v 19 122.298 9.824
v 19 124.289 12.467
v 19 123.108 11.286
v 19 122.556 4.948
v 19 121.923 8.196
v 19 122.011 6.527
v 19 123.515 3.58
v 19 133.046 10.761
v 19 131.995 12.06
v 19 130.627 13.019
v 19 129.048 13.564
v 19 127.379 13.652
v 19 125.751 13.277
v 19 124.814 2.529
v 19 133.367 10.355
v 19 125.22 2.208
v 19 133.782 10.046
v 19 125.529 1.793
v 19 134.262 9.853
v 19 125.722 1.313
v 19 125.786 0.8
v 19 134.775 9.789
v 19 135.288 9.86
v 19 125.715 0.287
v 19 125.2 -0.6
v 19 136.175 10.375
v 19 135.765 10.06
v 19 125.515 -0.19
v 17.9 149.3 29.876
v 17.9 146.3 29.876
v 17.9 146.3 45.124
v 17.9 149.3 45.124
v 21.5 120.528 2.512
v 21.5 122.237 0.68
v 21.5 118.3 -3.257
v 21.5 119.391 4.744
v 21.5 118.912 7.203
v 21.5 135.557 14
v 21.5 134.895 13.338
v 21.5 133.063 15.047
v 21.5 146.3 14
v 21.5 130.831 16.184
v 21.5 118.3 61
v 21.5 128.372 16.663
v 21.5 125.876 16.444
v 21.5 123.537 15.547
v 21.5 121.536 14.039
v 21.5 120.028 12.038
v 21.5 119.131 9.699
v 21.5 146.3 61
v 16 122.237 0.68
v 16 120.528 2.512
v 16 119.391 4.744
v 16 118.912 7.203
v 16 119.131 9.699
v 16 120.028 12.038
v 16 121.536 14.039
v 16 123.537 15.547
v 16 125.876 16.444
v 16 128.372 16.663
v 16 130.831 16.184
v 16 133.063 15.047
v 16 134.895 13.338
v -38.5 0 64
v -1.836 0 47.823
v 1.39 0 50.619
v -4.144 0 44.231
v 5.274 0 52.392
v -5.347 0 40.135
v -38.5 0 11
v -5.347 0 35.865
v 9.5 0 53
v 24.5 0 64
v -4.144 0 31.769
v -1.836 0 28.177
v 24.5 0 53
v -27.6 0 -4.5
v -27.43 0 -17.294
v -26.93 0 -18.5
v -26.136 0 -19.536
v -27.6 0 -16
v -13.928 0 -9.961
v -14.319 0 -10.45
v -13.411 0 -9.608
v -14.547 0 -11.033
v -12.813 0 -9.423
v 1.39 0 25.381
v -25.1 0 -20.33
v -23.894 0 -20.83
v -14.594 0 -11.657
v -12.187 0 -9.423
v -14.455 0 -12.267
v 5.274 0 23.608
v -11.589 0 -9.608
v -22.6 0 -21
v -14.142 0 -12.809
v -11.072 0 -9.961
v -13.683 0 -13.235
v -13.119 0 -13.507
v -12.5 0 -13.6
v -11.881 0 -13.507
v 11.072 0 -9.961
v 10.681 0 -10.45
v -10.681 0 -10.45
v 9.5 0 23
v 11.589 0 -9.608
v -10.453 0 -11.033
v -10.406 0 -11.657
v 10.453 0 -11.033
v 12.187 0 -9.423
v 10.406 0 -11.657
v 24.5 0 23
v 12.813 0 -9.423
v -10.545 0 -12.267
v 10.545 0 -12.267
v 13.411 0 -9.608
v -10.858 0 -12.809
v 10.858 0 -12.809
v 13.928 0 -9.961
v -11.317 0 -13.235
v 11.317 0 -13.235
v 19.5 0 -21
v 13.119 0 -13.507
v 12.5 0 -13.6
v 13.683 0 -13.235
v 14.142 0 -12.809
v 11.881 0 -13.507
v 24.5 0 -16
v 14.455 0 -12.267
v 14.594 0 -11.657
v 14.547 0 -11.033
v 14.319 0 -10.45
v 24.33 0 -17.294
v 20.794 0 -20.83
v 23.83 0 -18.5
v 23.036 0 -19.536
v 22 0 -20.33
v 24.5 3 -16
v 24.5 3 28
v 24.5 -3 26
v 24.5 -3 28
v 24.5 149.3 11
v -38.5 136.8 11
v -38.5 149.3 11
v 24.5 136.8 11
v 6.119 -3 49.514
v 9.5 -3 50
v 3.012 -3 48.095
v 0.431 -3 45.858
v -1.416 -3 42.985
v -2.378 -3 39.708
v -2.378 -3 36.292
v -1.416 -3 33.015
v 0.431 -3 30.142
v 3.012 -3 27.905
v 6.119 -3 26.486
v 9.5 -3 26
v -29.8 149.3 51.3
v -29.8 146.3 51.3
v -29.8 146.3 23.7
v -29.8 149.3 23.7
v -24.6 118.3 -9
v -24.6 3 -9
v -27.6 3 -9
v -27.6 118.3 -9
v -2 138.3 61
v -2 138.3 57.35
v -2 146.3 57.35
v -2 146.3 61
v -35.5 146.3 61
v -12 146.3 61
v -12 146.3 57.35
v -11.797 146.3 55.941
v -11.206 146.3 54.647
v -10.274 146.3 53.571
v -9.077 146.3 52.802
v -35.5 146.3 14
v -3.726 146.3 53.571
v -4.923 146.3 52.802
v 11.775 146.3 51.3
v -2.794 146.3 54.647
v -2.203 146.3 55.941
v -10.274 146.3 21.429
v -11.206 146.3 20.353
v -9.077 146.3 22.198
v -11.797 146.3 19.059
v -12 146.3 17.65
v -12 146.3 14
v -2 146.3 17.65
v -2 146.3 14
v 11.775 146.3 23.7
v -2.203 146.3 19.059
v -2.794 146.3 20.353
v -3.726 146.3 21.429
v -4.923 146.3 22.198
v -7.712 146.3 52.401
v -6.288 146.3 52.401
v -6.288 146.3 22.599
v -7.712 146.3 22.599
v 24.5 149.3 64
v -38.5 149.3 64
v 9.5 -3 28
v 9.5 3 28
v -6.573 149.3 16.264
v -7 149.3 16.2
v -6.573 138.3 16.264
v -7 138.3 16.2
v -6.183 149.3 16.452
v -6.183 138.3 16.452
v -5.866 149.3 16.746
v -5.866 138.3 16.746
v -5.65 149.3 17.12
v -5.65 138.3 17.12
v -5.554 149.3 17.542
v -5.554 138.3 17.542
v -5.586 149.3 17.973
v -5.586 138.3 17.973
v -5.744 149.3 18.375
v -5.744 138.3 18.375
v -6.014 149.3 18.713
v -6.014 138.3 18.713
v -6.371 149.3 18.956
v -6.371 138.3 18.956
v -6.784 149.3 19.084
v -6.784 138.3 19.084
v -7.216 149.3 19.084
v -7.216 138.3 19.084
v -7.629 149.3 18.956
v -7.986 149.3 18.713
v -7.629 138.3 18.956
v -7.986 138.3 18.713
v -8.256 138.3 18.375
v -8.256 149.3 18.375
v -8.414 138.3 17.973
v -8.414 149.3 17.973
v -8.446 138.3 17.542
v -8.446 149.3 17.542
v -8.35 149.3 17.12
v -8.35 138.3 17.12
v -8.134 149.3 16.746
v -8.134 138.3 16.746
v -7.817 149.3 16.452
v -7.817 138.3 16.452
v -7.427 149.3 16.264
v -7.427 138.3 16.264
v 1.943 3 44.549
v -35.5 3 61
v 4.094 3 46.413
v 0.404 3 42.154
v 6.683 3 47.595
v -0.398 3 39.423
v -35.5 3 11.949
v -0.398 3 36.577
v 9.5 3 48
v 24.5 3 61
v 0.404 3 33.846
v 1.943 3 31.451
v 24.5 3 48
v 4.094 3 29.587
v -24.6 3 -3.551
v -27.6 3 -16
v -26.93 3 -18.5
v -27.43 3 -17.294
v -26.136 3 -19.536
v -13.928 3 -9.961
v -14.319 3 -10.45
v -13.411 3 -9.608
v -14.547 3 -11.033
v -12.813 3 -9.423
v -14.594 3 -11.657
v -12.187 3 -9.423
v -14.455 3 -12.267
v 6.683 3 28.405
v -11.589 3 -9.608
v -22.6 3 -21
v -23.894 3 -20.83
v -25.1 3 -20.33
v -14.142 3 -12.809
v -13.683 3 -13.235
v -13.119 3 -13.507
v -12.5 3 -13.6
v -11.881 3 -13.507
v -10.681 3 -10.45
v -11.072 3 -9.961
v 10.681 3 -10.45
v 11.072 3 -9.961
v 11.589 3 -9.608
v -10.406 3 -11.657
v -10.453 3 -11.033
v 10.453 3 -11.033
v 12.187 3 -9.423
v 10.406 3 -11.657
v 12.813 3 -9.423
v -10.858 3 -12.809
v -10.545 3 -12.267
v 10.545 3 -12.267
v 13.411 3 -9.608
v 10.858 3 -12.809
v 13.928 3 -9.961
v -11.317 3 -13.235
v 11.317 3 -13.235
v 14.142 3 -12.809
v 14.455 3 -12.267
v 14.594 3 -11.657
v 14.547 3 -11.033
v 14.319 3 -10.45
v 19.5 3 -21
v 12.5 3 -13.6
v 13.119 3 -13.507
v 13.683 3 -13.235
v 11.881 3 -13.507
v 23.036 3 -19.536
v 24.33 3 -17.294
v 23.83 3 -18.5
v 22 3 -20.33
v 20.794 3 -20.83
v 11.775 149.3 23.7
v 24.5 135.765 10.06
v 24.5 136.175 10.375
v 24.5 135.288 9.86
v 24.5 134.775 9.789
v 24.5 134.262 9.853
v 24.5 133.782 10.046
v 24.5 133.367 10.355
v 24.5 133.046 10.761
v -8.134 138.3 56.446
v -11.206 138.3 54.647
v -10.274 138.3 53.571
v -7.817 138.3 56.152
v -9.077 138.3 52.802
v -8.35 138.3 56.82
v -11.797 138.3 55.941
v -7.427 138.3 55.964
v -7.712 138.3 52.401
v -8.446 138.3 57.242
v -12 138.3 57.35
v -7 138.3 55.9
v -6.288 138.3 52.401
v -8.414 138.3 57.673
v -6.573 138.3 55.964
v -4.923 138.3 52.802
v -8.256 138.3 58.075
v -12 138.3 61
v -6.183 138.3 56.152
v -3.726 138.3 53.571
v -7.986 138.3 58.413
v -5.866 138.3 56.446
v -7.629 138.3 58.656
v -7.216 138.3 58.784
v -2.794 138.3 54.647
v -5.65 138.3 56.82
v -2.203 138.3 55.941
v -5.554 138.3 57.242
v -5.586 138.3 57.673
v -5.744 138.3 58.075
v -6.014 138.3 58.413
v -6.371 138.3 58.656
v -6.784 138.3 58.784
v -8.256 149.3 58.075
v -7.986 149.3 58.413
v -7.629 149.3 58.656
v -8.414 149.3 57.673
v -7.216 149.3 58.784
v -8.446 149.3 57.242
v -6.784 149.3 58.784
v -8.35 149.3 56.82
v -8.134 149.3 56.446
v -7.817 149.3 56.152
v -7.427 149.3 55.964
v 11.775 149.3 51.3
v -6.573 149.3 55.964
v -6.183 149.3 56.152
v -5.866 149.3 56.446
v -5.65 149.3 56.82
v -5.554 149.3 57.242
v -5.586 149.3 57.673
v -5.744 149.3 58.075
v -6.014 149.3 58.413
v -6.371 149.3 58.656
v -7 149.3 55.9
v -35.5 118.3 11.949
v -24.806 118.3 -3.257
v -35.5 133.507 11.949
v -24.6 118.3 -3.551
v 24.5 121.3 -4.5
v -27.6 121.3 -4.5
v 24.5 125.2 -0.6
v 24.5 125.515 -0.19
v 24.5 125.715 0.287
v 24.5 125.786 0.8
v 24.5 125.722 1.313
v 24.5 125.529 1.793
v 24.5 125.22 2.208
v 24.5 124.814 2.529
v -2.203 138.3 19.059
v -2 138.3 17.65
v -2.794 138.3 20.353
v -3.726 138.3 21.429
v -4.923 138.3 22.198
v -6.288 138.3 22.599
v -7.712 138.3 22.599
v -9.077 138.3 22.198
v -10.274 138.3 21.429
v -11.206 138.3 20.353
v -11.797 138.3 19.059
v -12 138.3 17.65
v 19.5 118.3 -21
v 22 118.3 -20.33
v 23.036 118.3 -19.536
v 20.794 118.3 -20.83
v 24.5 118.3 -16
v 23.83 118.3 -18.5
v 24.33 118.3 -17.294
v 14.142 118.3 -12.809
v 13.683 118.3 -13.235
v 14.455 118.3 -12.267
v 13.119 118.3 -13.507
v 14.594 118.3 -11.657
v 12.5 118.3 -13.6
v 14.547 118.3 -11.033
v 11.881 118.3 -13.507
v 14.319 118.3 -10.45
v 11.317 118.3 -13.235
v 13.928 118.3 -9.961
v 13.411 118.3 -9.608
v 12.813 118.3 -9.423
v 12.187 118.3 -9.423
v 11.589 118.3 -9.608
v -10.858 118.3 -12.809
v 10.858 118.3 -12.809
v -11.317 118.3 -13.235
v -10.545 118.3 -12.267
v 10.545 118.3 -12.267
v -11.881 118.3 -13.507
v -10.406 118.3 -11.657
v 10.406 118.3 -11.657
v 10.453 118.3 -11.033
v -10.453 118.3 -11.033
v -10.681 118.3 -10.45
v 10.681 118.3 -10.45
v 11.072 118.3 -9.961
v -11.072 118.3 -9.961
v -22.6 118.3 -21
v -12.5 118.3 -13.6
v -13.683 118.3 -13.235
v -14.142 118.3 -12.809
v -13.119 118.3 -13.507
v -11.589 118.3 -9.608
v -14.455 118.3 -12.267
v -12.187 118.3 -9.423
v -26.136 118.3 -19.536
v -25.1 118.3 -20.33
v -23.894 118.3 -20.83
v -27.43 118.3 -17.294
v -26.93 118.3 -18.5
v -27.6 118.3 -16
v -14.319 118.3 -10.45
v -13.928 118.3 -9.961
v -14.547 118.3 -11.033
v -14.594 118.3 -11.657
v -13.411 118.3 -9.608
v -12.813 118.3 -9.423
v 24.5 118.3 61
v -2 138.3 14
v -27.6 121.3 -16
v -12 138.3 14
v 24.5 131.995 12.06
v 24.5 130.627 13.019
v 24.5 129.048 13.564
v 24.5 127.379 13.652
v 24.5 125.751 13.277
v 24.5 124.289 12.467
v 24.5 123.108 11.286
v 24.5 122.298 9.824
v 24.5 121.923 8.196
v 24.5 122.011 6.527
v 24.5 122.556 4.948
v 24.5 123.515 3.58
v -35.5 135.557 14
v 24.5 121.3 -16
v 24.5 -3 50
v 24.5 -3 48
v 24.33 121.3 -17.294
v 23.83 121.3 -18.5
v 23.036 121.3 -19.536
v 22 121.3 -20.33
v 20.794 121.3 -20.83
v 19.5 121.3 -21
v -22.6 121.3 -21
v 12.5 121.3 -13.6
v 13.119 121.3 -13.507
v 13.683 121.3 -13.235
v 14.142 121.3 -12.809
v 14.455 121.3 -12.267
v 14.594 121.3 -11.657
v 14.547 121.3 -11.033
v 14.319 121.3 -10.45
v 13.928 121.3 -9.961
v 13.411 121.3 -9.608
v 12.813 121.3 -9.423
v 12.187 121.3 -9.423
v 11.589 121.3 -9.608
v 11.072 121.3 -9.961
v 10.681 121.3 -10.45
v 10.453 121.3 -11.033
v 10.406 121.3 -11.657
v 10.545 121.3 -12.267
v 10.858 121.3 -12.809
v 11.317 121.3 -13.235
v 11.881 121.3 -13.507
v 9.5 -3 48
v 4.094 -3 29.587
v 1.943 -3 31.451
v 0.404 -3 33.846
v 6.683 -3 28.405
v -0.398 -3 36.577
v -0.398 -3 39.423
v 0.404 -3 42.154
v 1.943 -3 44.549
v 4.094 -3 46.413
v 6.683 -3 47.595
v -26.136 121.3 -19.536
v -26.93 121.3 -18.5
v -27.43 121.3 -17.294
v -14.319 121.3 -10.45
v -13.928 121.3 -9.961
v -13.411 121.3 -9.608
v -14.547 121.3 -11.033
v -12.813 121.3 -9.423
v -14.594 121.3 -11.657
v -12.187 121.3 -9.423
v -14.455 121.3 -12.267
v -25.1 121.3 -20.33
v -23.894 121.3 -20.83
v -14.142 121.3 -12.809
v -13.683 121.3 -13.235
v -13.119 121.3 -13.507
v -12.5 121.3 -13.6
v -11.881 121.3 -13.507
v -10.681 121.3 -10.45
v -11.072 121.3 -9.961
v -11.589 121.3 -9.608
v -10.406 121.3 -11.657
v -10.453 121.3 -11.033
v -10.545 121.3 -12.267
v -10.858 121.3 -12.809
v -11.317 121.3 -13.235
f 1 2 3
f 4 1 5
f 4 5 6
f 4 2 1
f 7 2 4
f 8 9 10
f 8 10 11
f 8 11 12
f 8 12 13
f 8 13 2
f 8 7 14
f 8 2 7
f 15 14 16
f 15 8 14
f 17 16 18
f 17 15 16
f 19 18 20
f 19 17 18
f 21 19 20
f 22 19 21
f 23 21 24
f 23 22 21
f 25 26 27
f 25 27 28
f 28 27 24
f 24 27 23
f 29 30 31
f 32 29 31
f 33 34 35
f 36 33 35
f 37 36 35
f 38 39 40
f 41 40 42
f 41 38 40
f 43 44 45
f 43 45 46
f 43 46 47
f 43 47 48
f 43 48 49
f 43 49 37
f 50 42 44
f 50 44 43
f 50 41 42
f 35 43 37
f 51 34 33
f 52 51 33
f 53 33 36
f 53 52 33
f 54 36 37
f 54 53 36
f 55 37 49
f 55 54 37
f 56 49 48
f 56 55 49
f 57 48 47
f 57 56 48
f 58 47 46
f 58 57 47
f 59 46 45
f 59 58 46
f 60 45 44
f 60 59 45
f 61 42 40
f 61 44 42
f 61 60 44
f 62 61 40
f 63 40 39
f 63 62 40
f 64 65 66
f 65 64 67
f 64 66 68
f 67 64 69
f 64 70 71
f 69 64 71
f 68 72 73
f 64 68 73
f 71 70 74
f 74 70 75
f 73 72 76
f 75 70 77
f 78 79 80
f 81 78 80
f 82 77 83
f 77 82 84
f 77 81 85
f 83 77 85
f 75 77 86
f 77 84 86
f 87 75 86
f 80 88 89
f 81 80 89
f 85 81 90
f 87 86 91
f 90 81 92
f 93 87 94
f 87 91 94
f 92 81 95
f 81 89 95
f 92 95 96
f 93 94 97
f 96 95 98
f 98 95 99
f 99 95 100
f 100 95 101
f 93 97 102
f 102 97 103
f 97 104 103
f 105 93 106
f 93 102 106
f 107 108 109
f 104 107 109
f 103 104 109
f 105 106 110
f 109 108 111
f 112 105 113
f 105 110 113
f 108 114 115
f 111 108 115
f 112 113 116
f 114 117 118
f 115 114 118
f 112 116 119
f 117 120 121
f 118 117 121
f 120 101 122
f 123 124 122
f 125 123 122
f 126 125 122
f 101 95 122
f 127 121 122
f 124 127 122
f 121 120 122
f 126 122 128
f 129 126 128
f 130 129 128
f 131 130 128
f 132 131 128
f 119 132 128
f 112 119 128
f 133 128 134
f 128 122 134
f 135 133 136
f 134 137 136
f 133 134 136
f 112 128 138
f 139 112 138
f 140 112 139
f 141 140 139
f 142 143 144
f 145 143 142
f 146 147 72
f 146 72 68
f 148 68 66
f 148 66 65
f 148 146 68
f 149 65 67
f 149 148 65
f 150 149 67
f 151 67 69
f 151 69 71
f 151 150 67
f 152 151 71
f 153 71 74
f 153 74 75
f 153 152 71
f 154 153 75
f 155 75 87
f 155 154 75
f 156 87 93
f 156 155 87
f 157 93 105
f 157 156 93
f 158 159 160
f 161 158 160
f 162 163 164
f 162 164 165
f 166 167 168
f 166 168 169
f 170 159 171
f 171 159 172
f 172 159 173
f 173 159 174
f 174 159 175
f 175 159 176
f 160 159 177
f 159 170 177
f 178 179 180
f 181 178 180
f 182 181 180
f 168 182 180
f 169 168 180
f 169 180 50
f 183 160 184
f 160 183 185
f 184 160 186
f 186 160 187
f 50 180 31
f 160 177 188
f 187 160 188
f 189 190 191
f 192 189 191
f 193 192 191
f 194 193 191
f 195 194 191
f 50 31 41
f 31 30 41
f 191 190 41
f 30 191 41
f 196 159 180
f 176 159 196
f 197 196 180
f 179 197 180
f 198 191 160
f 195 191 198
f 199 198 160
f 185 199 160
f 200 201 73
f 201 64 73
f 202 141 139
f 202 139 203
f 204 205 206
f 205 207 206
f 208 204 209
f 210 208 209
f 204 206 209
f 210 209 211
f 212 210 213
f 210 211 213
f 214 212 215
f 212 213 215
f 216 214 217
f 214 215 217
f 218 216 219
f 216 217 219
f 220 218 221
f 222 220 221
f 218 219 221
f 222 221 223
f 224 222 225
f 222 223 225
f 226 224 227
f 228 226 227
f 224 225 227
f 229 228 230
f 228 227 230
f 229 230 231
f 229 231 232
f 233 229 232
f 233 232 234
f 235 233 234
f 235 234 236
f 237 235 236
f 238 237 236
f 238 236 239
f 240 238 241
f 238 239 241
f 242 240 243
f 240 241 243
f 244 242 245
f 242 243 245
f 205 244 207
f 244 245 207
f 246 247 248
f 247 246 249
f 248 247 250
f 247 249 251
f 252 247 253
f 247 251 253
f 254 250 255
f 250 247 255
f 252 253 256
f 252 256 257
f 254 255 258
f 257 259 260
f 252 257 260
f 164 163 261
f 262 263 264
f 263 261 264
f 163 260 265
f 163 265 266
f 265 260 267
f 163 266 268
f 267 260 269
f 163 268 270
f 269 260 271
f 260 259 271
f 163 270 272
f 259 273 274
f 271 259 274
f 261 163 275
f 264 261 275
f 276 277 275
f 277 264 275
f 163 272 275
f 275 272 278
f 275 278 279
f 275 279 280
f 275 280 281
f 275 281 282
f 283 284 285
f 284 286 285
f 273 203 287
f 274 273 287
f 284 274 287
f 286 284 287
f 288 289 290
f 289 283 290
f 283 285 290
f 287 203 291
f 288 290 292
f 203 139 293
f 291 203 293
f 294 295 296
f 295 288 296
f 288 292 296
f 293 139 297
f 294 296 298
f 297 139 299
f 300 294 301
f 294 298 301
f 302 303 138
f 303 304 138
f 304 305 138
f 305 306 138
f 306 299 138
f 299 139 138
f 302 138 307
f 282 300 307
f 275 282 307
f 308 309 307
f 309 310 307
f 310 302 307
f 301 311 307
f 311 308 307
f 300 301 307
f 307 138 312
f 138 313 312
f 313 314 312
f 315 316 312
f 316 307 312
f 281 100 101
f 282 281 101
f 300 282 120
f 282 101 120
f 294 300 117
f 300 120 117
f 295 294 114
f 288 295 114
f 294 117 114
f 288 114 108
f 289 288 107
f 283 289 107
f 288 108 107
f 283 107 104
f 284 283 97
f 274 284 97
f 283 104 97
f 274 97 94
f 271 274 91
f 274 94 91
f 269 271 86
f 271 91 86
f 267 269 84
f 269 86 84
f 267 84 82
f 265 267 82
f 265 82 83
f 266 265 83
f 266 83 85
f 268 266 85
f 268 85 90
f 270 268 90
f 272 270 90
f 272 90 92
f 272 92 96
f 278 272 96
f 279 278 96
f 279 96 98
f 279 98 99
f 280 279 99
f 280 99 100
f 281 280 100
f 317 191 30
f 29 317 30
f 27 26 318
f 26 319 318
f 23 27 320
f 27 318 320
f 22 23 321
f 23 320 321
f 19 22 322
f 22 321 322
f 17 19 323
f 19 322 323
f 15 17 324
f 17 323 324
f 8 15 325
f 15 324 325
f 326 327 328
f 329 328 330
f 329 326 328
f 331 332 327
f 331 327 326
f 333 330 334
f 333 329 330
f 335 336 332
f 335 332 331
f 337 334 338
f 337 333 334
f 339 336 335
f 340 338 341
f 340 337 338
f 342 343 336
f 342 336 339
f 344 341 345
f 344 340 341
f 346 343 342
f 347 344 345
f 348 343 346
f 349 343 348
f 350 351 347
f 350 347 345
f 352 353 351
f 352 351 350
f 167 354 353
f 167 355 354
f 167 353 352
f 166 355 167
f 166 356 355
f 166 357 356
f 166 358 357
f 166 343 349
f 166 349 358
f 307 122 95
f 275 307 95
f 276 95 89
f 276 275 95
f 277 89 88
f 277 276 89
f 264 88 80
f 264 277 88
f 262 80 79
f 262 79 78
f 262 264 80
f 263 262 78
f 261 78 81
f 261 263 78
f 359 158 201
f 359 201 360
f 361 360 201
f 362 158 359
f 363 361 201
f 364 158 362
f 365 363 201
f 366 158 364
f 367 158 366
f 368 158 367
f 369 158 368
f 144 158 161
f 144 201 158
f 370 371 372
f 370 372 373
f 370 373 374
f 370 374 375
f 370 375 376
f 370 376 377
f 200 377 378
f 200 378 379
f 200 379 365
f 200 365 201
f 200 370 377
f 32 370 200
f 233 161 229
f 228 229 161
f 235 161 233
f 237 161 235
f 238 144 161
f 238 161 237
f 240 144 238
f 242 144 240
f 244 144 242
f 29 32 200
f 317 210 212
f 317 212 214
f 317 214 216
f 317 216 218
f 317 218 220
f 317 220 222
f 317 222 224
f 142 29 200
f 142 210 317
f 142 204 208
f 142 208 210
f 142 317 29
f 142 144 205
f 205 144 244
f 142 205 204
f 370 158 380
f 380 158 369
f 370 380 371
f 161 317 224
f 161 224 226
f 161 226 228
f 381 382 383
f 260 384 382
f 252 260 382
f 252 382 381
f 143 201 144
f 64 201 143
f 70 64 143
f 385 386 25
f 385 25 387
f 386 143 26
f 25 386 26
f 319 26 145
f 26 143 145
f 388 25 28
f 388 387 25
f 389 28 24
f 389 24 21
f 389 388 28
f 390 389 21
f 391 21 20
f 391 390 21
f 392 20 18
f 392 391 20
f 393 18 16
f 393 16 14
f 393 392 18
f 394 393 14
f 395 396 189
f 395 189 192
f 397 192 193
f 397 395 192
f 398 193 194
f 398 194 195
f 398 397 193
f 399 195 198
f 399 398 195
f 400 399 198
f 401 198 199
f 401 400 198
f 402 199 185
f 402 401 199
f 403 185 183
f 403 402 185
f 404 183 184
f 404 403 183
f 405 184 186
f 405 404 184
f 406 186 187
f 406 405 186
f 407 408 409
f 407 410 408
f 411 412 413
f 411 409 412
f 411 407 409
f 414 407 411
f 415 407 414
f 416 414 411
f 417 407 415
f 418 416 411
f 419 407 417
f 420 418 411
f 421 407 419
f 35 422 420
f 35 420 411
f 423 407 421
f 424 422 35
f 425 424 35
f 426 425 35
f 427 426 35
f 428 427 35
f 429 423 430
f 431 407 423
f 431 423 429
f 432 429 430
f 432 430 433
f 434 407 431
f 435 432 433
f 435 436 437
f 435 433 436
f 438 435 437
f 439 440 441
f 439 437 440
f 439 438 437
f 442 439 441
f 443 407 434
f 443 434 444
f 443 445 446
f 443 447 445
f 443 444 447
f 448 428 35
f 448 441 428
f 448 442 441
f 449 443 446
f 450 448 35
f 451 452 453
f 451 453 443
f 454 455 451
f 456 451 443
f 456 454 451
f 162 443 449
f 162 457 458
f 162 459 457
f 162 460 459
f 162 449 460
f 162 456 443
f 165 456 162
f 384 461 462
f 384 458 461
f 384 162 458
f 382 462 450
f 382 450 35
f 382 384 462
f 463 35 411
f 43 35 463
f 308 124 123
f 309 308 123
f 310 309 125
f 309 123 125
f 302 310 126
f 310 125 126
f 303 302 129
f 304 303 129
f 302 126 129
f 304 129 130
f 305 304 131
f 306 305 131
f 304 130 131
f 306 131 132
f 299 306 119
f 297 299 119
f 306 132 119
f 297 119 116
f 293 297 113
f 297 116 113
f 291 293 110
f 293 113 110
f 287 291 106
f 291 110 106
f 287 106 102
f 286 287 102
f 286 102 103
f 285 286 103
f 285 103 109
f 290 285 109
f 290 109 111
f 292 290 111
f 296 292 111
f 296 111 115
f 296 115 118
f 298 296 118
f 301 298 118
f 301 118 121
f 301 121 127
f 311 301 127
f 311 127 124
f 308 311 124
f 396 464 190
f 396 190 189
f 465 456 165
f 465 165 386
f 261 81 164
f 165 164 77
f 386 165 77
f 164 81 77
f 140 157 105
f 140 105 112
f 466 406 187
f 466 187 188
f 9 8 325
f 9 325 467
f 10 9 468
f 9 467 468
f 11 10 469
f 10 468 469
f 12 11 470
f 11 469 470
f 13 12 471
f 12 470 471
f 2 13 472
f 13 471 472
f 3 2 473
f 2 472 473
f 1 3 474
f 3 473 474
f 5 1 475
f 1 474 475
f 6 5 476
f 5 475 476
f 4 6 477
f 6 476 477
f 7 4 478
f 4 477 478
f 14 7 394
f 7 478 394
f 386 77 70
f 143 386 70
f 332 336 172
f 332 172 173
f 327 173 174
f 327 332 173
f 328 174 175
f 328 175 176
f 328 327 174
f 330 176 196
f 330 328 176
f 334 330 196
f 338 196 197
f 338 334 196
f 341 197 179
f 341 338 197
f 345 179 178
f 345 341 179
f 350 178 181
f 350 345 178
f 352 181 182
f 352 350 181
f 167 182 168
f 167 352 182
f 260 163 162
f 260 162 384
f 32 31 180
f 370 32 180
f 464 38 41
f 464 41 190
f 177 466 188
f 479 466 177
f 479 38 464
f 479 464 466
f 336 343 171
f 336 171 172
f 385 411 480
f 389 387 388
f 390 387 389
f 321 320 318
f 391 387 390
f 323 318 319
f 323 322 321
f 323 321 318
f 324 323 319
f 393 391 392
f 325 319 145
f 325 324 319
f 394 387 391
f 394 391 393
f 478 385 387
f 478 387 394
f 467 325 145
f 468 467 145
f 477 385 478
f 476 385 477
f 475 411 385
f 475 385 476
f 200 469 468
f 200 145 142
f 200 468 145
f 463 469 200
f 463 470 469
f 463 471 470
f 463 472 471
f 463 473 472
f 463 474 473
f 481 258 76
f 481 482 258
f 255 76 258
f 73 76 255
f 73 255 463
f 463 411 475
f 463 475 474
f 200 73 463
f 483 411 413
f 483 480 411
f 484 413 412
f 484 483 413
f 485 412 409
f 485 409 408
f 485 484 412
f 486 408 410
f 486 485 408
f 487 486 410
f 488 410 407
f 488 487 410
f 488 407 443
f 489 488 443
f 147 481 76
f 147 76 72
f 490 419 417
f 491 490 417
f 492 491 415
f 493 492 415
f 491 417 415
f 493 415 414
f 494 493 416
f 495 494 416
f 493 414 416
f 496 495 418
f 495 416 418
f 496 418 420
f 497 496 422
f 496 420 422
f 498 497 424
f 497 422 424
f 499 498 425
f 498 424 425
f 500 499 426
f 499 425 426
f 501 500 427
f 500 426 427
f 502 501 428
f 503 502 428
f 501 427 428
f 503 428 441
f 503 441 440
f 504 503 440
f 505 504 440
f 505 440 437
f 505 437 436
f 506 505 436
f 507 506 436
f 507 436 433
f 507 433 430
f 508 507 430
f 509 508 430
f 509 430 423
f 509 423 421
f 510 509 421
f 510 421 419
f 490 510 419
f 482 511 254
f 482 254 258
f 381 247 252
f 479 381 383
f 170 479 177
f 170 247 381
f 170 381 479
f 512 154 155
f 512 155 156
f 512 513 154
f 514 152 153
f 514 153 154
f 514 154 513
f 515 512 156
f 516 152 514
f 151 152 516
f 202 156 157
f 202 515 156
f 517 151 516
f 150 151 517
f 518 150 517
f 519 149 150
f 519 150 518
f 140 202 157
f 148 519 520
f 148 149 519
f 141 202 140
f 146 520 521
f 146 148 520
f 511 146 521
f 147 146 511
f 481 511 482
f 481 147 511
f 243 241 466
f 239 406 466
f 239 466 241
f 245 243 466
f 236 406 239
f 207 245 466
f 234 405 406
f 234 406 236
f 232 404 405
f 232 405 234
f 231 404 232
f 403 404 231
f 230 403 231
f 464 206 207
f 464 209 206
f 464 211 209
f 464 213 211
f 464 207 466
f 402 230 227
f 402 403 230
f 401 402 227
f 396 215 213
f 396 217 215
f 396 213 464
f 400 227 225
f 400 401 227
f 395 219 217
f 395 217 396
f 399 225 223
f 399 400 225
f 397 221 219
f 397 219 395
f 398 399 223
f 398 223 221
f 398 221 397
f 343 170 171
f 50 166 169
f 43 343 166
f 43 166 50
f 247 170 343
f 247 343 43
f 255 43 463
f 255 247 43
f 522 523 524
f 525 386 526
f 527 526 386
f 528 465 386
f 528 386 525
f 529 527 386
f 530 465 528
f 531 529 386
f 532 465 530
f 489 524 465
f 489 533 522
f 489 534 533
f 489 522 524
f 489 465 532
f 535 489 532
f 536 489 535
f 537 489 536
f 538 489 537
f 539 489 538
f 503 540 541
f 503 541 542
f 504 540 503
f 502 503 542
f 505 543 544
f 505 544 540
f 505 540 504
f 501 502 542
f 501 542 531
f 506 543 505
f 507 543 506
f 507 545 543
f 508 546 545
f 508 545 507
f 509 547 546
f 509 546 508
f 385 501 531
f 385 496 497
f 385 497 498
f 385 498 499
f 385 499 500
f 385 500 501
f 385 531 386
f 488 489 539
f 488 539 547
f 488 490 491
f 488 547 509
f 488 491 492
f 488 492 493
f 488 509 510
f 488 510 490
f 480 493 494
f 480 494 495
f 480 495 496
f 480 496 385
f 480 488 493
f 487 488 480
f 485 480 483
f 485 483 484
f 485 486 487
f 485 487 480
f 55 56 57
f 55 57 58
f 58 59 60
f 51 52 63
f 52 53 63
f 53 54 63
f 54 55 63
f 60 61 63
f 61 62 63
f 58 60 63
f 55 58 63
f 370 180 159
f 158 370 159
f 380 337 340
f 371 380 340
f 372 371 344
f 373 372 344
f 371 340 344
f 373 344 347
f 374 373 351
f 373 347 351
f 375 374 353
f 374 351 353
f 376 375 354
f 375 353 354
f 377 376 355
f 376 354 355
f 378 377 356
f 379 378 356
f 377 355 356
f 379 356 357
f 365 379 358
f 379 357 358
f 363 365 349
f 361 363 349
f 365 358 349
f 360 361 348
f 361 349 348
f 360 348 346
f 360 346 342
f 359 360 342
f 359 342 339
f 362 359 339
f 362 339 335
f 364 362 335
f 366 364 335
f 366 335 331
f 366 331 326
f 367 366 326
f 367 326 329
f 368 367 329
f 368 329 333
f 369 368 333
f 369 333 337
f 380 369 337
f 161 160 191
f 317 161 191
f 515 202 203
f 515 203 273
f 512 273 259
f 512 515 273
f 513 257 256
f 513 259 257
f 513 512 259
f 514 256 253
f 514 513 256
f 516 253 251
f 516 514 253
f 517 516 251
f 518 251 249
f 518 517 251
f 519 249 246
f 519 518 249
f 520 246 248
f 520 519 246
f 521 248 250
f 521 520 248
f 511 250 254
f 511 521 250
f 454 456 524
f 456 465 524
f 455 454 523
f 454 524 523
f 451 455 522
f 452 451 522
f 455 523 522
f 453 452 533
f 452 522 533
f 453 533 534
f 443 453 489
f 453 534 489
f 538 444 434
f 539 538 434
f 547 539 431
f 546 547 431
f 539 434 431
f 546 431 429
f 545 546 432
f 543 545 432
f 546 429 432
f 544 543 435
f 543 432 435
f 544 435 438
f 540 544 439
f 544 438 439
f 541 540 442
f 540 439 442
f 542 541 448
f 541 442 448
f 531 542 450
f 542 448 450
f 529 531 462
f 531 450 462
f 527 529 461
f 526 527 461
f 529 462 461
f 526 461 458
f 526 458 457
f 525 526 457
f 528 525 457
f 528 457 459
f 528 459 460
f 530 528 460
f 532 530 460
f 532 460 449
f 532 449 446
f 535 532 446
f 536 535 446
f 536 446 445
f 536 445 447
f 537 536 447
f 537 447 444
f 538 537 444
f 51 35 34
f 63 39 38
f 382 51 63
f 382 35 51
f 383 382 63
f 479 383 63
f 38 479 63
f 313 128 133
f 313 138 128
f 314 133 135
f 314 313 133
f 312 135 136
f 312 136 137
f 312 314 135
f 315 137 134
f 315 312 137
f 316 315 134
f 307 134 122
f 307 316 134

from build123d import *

# Parameters (mm, degrees)
SKETCH2_W           = 63
SKETCH2_H           = 53
BOSS_EXTRUDE1_DEPTH = 121.3
BOSS_EXTRUDE2_START = 121.3
SKETCH2_3_W         = 63
SKETCH2_3_H         = 53
BOSS_EXTRUDE2_DEPTH = 28
CHAMFER5_SIZE       = 15.5
SKETCH7_R           = 6
CUT_EXTRUDE3_DEPTH  = 5.5
FILLET5_R           = 2
SHELL2_START        = 3
SHELL2_DEPTH        = 115.3
SHELL2_START_2      = 134.895176786
SHELL2_2_DEPTH      = 11.404823214
SHELL2_START_3      = 118.3
SHELL2_3_DEPTH      = 0.6
SHELL2_START_4      = -35.5
SHELL2_4_DEPTH      = 51.5
SHELL2_START_5      = 16
SHELL2_5_DEPTH      = 8.5
SHELL2_START_6      = -25.165077586
SHELL2_6_DEPTH      = 3
SKETCH4_W           = 12
SKETCH4_H           = 115.3
CUT_EXTRUDE1_DEPTH  = 175.228269807
BOSS_EXTRUDE5_START = -3
BOSS_EXTRUDE5_DEPTH = 3
CUT_EXTRUDE2_REACH  = 168.939
SKETCH6_R           = 2.1
SKETCH8_R           = 1.45
CUT_EXTRUDE4_DEPTH  = 3
BOSS_EXTRUDE6_START = 8
SKETCH8_3_R         = 1.45
BOSS_EXTRUDE6_DEPTH = 8
CUT_EXTRUDE5_REACH  = 168.939
BOSS_EXTRUDE7_START = 3
BOSS_EXTRUDE7_DEPTH = 3
CHAMFER7_SIZE       = 3
FILLET6_R           = 5


with BuildPart() as part:
    # Sketch2 → Boss-Extrude1 (new body)
    with BuildSketch(Plane(origin=(0, 0, 0), x_dir=(1, 0, 0), z_dir=(0, 1, 0))):
        Polygon((24.5, -11), (24.5, 21), (-27.6, 21), (-27.6, 4.5), (-38.5, -11), align=None)
        with Locations((-7, -37.5)):
            Rectangle(SKETCH2_W, SKETCH2_H)
    extrude(amount=BOSS_EXTRUDE1_DEPTH)

    # Sketch2<3> → Boss-Extrude2 (add)
    with BuildSketch(Plane(origin=(0, 0, 0), x_dir=(1, 0, 0), z_dir=(0, 1, 0)).offset(BOSS_EXTRUDE2_START)):
        with Locations((-7, -37.5)):
            Rectangle(SKETCH2_3_W, SKETCH2_3_H)
    extrude(amount=BOSS_EXTRUDE2_DEPTH)

    # Chamfer5
    chamfer5_edges = [part.edges().sort_by_distance(p)[0] for p in [
        (-7, 121.3, 11),
    ]]
    chamfer(chamfer5_edges, length=CHAMFER5_SIZE)

    # Sketch7 → Cut-Extrude3 (cut)
    with BuildSketch(Plane(origin=(24.5, 0, 0), x_dir=(0, 0, -1), z_dir=(1, 0, 0))):
        with Locations((-7.675, 127.9)):
            Circle(SKETCH7_R)
    extrude(amount=-CUT_EXTRUDE3_DEPTH, mode=Mode.SUBTRACT)

    # Fillet5
    fillet5_edges = [part.edges().sort_by_distance(p)[0] for p in [
        (21.75, 133.885912692, 8.085912692),
        (21.75, 127.489087308, 1.689087308),
    ]]
    fillet(fillet5_edges, radius=FILLET5_R)

    # Shell2: read off the stored shape, not the designer's step
    # Shell2 outline → Shell2 (cut)
    with BuildSketch(Plane(origin=(0, 0, 0), x_dir=(1, 0, 0), z_dir=(0, 1, 0)).offset(SHELL2_START)):
        Polygon((-24.6, 3.550767359), (-35.5, -11.949232641), (-35.5, -61), (24.5, -61), (24.5, 18), (-24.6, 18), align=None)
    extrude(amount=SHELL2_DEPTH, mode=Mode.SUBTRACT)

    # Shell2 2 outline → Shell2 2 (cut)
    with BuildSketch(Plane(origin=(0, 0, 0), x_dir=(1, 0, 0), z_dir=(0, 1, 0)).offset(SHELL2_START_2)):
        Polygon((16, -14), (-35.5, -14), (-35.5, -61), (24.5, -61), (24.5, -14), align=None)
    extrude(amount=SHELL2_2_DEPTH, mode=Mode.SUBTRACT)

    # Shell2 3 outline → Shell2 3 (cut)
    with BuildSketch(Plane(origin=(0, 0, 0), x_dir=(1, 0, 0), z_dir=(0, 1, 0)).offset(SHELL2_START_3)):
        Polygon((16, -14), (-35.5, -14), (-35.5, -61), (24.5, -61), (24.5, -14), align=None)
    extrude(amount=SHELL2_3_DEPTH, mode=Mode.SUBTRACT)

    # Shell2 4 outline → Shell2 4 (cut)
    with BuildSketch(Plane.YZ.offset(SHELL2_START_4)):
        Polygon((134.895176786, 61), (118.9, 61), (118.9, 14), (118.3, 14), (118.3, -3.257359313), (135.557359313, 14), (134.895176786, 14), align=None)
    extrude(amount=SHELL2_4_DEPTH, mode=Mode.SUBTRACT)

    # Shell2 5 outline → Shell2 5 (cut)
    with BuildSketch(Plane.YZ.offset(SHELL2_START_5)):
        with BuildLine():
            Line((134.895176786, 61), (118.9, 61))
            Line((118.9, 61), (118.9, 14))
            Line((118.9, 14), (118.3, 14))
            Line((118.3, 14), (118.3, -3.257359313))
            Line((118.3, -3.257359313), (122.237182527, 0.679823214))
            ThreePointArc((122.237182527, 0.679823214), (121.536038969, 14.038961031), (134.895176786, 13.337817473))
            Line((134.895176786, 13.337817473), (135.557359313, 14))
            Line((135.557359313, 14), (134.895176786, 14))
            Line((134.895176786, 14), (134.895176786, 61))
        make_face()
    extrude(amount=SHELL2_5_DEPTH, mode=Mode.SUBTRACT)

    # Shell2 6 outline → Shell2 6 (add)
    with BuildSketch(Plane(origin=(0, 0, 0), x_dir=(0.5752319297142107, 0, -0.8179903587679168), z_dir=(0.8179903587679168, 0, 0.5752319297142109)).offset(SHELL2_START_6)):
        Polygon((-30.1950906, 3), (-11.246212005, 3), (-11.246212005, 118.3), (-11.604905776, 118.3), (-30.1950906, 133.506591954), align=None)
    extrude(amount=SHELL2_6_DEPTH)

    # Sketch4 → Cut-Extrude1 (cut, through all)
    with BuildSketch(Plane(origin=(24.5, 0, 0), x_dir=(0, 0, -1), z_dir=(1, 0, 0))):
        with Locations((15, 60.65)):
            Rectangle(SKETCH4_W, SKETCH4_H)
    extrude(amount=-CUT_EXTRUDE1_DEPTH, mode=Mode.SUBTRACT)

    # Sketch5 → Boss-Extrude5 (add)
    with BuildSketch(Plane(origin=(24.5, 0, 0), x_dir=(0, 0, -1), z_dir=(1, 0, 0)).offset(BOSS_EXTRUDE5_START)):
        with BuildLine():
            Line((3.257359313, 118.3), (-61, 118.3))
            Line((-61, 118.3), (-61, 146.3))
            Line((-61, 146.3), (-14, 146.3))
            Line((-14, 146.3), (-14, 135.557359313))
            Line((-14, 135.557359313), (-13.337817473, 134.895176786))
            ThreePointArc((-13.337817473, 134.895176786), (-14.038961031, 121.536038969), (-0.679823214, 122.237182527))
            Line((-0.679823214, 122.237182527), (3.257359313, 118.3))
        make_face()
    extrude(amount=BOSS_EXTRUDE5_DEPTH)

    # Cut-Extrude2: up to this face of the body (flat: up to its plane)
    cut_extrude2_end = Plane(part.part.faces().sort_by_distance((-1.55, 121.3, -12.75))[0])
    # Sketch6 → Cut-Extrude2 (cut, up to the picked face)
    with BuildSketch(Plane.XZ, mode=Mode.PRIVATE) as cut_extrude2_sk1:
        with Locations(Location((-12.5, -11.5, 0), (0, 0, 270))):
            Circle(SKETCH6_R)
    cut_extrude2_tool1 = split(extrude(cut_extrude2_sk1.sketch, amount=-CUT_EXTRUDE2_REACH, mode=Mode.PRIVATE), bisect_by=cut_extrude2_end, keep=Keep.BOTH, mode=Mode.PRIVATE)
    # Sketch6 → Cut-Extrude2 (cut, up to the picked face)
    with BuildSketch(Plane.XZ, mode=Mode.PRIVATE) as cut_extrude2_sk2:
        with Locations(Location((12.5, -11.5, 0), (0, 0, 270))):
            Circle(SKETCH6_R)
    cut_extrude2_tool2 = split(extrude(cut_extrude2_sk2.sketch, amount=-CUT_EXTRUDE2_REACH, mode=Mode.PRIVATE), bisect_by=cut_extrude2_end, keep=Keep.BOTH, mode=Mode.PRIVATE)
    add(cut_extrude2_tool1.solids().sort_by(Axis((-12.5, 0, -11.5), (0, 1, 0)))[0], mode=Mode.SUBTRACT)
    add(cut_extrude2_tool2.solids().sort_by(Axis((12.5, 0, -11.5), (0, 1, 0)))[0], mode=Mode.SUBTRACT)

    # Sketch8 → Cut-Extrude4 (cut)
    with BuildSketch(Plane.XZ.offset(-146.3)):
        Polygon((17.9, 45.123529412), (11.775, 51.3), (-29.8, 51.3), (-29.8, 23.7), (11.775, 23.7), (17.9, 29.876470588), align=None)
        with Locations(Location((-7, 17.65, 0), (0, 0, 270))):
            Circle(SKETCH8_R)
        with Locations(Location((-7, 57.35, 0), (0, 0, 270))):
            Circle(SKETCH8_R)
    extrude(amount=-CUT_EXTRUDE4_DEPTH, mode=Mode.SUBTRACT)

    # Sketch8<3> → Boss-Extrude6 (add)
    # profile 1 of 2: a face of its own
    with BuildSketch(Plane.XZ.offset(-146.3).offset(BOSS_EXTRUDE6_START)):
        with BuildLine():
            Line((-12, 61), (-12, 57.35))
            ThreePointArc((-12, 57.35), (-7, 52.35), (-2, 57.35))
            Line((-2, 57.35), (-2, 61))
            Line((-2, 61), (-12, 61))
        make_face()
        with Locations(Location((-7, 57.35, 0), (0, 0, 270))):
            Circle(SKETCH8_3_R, mode=Mode.SUBTRACT)
    # profile 2 of 2: a face of its own
    with BuildSketch(Plane.XZ.offset(-146.3).offset(BOSS_EXTRUDE6_START)):
        with BuildLine():
            ThreePointArc((-2, 17.65), (-7, 22.65), (-12, 17.65))
            Line((-12, 17.65), (-12, 14))
            Line((-12, 14), (-2, 14))
            Line((-2, 14), (-2, 17.65))
        make_face()
        with Locations(Location((-7, 17.65, 0), (0, 0, 270))):
            Circle(SKETCH8_3_R, mode=Mode.SUBTRACT)
    extrude(amount=-BOSS_EXTRUDE6_DEPTH)

    # Sketch9 → Cut-Extrude5 (cut, up to next)
    with BuildSketch(Plane.XZ, mode=Mode.PRIVATE) as cut_extrude5_sk1:
        with BuildLine():
            Line((24.5, 48), (9.5, 48))
            ThreePointArc((9.5, 48), (-0.5, 38), (9.5, 28))
            Line((9.5, 28), (24.5, 28))
            Line((24.5, 28), (24.5, 48))
        make_face()
    cut_extrude5_tool1 = extrude(cut_extrude5_sk1.sketch, amount=-CUT_EXTRUDE5_REACH, mode=Mode.PRIVATE) & part.part
    add(cut_extrude5_tool1.solids().sort_by_distance((12.964021, 0, 38))[0], mode=Mode.SUBTRACT)

    # Sketch9<4> → Boss-Extrude7 (add)
    with BuildSketch(Plane.XZ.offset(BOSS_EXTRUDE7_START)):
        with BuildLine():
            ThreePointArc((9.5, 28), (-0.5, 38), (9.5, 48))
            Line((9.5, 48), (24.5, 48))
            Line((24.5, 48), (24.5, 50))
            Line((24.5, 50), (9.5, 50))
            ThreePointArc((9.5, 50), (-2.5, 38), (9.5, 26))
            Line((9.5, 26), (24.5, 26))
            Line((24.5, 26), (24.5, 28))
            Line((24.5, 28), (9.5, 28))
        make_face()
    extrude(amount=-BOSS_EXTRUDE7_DEPTH)

    # Chamfer7
    chamfer7_edges = [part.edges().sort_by_distance(p)[0] for p in [
        (17, 0, 26),
        (-2.5, 0, 38),
        (17, 0, 50),
    ]]
    chamfer(chamfer7_edges, length=CHAMFER7_SIZE - 0.0001)  # a hair under: the kernel refuses the full size

    # Fillet6
    fillet6_edges = [part.edges().sort_by_distance(p)[0] for p in [
        (-27.6, 1.5, -21),
        (24.5, 1.5, -21),
        (-27.6, 119.8, -21),
        (24.5, 119.8, -21),
    ]]
    fillet(fillet6_edges, radius=FILLET6_R)


solid = part.part
